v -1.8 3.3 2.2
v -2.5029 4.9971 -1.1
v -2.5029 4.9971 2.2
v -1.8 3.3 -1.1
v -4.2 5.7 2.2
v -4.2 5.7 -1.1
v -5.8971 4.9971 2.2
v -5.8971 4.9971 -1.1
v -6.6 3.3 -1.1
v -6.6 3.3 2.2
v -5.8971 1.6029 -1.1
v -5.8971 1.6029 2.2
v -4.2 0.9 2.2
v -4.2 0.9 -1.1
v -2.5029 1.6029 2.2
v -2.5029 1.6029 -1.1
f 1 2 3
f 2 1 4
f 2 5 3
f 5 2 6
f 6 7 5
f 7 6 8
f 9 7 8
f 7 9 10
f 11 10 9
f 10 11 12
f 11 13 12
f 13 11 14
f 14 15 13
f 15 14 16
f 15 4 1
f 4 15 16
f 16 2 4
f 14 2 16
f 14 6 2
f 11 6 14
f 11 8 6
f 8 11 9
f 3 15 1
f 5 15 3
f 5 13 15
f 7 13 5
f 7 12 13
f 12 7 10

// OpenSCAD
union() {
  translate([-4.2, 3.3, -1.1]) cylinder(h=3.3, r=2.4, center=false);
}
